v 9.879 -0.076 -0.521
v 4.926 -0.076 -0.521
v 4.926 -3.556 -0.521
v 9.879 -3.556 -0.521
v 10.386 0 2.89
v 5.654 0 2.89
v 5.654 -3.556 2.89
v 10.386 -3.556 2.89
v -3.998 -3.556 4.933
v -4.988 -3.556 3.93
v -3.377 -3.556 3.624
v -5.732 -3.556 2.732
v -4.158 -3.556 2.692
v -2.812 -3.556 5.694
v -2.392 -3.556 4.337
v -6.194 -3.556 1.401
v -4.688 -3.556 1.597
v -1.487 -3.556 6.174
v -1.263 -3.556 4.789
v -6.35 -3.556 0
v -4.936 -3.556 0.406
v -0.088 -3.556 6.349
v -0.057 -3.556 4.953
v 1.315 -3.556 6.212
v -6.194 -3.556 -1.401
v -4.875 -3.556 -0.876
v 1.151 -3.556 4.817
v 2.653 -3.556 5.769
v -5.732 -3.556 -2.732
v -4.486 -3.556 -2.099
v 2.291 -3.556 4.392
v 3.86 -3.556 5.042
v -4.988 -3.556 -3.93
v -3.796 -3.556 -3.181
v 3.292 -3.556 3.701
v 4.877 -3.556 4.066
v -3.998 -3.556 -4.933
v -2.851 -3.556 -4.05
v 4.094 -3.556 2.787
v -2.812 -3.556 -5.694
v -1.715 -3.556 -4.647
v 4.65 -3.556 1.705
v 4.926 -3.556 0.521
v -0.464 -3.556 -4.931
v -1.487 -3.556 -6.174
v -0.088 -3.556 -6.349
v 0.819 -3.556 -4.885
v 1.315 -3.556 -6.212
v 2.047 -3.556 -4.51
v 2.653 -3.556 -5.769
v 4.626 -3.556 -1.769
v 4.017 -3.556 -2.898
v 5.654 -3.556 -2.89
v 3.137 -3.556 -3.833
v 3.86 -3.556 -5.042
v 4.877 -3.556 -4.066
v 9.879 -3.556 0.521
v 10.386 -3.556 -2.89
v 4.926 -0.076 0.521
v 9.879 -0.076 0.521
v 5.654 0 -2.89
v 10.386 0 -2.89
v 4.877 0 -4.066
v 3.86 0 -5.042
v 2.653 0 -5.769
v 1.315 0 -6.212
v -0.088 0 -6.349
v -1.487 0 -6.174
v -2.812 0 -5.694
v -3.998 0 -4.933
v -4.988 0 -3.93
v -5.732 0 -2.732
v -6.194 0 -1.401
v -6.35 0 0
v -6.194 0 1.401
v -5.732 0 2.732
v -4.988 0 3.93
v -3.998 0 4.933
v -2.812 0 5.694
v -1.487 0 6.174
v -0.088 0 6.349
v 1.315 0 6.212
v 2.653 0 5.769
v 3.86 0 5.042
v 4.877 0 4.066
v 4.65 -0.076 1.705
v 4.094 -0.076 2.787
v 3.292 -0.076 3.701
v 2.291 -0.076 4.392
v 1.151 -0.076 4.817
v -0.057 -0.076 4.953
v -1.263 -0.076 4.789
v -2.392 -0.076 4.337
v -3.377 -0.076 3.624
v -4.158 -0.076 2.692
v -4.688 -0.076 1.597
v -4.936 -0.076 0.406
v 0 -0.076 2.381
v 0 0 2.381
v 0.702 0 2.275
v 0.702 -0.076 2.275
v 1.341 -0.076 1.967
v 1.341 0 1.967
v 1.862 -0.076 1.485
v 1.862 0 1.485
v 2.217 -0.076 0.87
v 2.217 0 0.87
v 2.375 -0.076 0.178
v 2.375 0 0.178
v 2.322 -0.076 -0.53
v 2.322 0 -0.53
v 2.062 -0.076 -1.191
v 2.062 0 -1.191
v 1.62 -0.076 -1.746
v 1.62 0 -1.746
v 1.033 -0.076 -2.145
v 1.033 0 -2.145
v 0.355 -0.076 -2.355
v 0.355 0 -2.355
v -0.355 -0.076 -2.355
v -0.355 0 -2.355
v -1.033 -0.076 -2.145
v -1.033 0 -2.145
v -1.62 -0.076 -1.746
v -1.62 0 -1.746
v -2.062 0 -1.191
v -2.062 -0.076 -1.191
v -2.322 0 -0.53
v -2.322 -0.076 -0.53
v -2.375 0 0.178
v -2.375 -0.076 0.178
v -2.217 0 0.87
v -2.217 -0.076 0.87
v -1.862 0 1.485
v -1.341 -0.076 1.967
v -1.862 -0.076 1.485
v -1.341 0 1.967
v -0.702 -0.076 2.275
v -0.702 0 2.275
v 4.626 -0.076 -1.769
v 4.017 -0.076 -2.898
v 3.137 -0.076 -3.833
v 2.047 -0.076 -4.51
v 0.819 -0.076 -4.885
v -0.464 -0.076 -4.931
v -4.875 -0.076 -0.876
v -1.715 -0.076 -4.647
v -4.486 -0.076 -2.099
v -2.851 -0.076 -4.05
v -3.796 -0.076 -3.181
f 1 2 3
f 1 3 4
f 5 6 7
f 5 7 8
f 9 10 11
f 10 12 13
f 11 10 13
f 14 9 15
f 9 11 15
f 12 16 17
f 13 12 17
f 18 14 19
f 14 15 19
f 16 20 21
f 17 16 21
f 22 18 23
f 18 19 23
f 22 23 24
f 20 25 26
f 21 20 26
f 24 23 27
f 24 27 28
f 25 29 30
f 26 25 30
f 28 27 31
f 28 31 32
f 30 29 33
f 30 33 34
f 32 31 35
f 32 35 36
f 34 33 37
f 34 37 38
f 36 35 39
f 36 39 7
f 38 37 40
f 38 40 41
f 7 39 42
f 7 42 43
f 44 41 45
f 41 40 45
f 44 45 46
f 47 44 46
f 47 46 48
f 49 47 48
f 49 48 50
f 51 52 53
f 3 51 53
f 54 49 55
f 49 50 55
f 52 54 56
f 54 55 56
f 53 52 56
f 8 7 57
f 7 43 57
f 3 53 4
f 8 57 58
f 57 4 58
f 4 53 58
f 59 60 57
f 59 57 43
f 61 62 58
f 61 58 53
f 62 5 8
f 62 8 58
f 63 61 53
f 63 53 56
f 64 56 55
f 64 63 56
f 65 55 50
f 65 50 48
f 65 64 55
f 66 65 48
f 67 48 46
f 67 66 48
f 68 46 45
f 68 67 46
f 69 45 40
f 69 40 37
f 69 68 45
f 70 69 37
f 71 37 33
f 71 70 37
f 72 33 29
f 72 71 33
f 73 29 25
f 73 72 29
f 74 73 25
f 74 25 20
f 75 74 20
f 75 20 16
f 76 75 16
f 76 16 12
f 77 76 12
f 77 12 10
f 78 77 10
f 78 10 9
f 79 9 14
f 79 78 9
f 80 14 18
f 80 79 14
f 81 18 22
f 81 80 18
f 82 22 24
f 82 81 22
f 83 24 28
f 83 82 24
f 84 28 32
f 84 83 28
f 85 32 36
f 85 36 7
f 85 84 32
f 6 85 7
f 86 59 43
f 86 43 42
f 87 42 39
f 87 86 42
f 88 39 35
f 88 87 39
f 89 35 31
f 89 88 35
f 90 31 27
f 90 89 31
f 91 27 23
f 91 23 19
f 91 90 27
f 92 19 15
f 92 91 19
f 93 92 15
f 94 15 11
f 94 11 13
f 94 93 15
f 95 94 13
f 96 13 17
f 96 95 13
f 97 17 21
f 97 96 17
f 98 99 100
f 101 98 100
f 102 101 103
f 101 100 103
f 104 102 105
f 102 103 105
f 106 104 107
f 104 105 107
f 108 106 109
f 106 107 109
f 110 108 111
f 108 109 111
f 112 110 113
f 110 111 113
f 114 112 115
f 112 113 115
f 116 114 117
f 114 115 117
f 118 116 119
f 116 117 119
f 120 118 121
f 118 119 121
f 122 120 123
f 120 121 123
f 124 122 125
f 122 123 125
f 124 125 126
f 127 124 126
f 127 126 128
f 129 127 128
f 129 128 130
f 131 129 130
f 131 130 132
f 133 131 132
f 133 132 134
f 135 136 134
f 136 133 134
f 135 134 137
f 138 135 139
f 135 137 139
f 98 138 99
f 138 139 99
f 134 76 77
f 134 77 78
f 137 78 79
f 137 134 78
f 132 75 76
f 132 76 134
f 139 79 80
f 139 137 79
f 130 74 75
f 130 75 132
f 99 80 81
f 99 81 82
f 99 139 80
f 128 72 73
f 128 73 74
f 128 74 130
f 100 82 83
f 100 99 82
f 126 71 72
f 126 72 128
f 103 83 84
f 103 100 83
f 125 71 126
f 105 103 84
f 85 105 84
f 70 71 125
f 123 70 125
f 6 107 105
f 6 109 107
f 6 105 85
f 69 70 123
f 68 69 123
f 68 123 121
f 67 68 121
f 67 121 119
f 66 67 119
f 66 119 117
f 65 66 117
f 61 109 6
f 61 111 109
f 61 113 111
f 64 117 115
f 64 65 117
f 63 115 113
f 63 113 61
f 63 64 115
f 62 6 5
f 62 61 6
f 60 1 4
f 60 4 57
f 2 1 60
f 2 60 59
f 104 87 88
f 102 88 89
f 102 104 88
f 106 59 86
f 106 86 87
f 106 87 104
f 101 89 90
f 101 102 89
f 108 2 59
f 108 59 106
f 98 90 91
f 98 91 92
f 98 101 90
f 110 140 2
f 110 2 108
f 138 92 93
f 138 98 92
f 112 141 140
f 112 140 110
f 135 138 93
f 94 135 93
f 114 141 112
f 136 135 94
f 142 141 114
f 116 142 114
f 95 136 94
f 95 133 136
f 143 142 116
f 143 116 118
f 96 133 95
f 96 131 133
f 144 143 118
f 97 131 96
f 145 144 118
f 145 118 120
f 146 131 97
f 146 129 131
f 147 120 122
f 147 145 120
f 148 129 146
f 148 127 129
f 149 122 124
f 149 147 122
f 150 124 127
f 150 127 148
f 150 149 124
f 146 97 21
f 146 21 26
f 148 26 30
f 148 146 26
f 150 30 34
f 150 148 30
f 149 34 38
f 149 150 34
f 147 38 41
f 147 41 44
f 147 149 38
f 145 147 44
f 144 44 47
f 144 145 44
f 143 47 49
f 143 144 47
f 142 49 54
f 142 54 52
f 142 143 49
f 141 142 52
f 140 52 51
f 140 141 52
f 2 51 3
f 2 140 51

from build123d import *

# Parameters (mm, degrees)
SKETCH3_R           = 2.38125
BOSS_EXTRUDE1_DEPTH = 3.556
CUT_EXTRUDE1_START  = -3.4798
SKETCH4_R           = 2.38125
CUT_EXTRUDE1_DEPTH  = 3.4798


with BuildPart() as part:
    # Sketch3 → Boss-Extrude1 (new body)
    with BuildSketch(Plane(origin=(0, 0, 0), x_dir=(1, 0, 0), z_dir=(0, 1, 0))):
        with BuildLine():
            Line((5.654009559, -2.890445624), (8.020116475, -2.890445624))
            Line((8.020116475, -2.890445624), (10.386223391, -2.890445624))
            Line((10.386223391, -2.890445624), (10.386223391, 2.890445624))
            Line((10.386223391, 2.890445624), (8.020116475, 2.890445624))
            Line((8.020116475, 2.890445624), (5.654009559, 2.890445624))
            ThreePointArc((5.654009559, 2.890445624), (-6.35, 0), (5.654009559, -2.890445624))
        make_face()
        Circle(SKETCH3_R, mode=Mode.SUBTRACT)
    extrude(amount=-BOSS_EXTRUDE1_DEPTH)

    # Sketch4 → Cut-Extrude1 (cut)
    with BuildSketch(Plane(origin=(0, -3.556, 0), x_dir=(-1, 0, 0), z_dir=(0, -1, 0)).offset(CUT_EXTRUDE1_START)):
        with BuildLine():
            ThreePointArc((4.936299023, -0.4064), (0.463581133, 4.931257602), (-4.925553828, 0.5207))
            Line((-4.925553828, 0.5207), (-7.402053828, 0.5207))
            Line((-7.402053828, 0.5207), (-9.878553828, 0.5207))
            Line((-9.878553828, 0.5207), (-9.878553828, -0.5207))
            Line((-9.878553828, -0.5207), (-7.402053828, -0.5207))
            Line((-7.402053828, -0.5207), (-4.925553828, -0.5207))
            ThreePointArc((-4.925553828, -0.5207), (0.05740198, -4.952667363), (4.936299023, -0.4064))
        make_face()
        Circle(SKETCH4_R, mode=Mode.SUBTRACT)
    extrude(amount=CUT_EXTRUDE1_DEPTH, mode=Mode.SUBTRACT)


solid = part.part
